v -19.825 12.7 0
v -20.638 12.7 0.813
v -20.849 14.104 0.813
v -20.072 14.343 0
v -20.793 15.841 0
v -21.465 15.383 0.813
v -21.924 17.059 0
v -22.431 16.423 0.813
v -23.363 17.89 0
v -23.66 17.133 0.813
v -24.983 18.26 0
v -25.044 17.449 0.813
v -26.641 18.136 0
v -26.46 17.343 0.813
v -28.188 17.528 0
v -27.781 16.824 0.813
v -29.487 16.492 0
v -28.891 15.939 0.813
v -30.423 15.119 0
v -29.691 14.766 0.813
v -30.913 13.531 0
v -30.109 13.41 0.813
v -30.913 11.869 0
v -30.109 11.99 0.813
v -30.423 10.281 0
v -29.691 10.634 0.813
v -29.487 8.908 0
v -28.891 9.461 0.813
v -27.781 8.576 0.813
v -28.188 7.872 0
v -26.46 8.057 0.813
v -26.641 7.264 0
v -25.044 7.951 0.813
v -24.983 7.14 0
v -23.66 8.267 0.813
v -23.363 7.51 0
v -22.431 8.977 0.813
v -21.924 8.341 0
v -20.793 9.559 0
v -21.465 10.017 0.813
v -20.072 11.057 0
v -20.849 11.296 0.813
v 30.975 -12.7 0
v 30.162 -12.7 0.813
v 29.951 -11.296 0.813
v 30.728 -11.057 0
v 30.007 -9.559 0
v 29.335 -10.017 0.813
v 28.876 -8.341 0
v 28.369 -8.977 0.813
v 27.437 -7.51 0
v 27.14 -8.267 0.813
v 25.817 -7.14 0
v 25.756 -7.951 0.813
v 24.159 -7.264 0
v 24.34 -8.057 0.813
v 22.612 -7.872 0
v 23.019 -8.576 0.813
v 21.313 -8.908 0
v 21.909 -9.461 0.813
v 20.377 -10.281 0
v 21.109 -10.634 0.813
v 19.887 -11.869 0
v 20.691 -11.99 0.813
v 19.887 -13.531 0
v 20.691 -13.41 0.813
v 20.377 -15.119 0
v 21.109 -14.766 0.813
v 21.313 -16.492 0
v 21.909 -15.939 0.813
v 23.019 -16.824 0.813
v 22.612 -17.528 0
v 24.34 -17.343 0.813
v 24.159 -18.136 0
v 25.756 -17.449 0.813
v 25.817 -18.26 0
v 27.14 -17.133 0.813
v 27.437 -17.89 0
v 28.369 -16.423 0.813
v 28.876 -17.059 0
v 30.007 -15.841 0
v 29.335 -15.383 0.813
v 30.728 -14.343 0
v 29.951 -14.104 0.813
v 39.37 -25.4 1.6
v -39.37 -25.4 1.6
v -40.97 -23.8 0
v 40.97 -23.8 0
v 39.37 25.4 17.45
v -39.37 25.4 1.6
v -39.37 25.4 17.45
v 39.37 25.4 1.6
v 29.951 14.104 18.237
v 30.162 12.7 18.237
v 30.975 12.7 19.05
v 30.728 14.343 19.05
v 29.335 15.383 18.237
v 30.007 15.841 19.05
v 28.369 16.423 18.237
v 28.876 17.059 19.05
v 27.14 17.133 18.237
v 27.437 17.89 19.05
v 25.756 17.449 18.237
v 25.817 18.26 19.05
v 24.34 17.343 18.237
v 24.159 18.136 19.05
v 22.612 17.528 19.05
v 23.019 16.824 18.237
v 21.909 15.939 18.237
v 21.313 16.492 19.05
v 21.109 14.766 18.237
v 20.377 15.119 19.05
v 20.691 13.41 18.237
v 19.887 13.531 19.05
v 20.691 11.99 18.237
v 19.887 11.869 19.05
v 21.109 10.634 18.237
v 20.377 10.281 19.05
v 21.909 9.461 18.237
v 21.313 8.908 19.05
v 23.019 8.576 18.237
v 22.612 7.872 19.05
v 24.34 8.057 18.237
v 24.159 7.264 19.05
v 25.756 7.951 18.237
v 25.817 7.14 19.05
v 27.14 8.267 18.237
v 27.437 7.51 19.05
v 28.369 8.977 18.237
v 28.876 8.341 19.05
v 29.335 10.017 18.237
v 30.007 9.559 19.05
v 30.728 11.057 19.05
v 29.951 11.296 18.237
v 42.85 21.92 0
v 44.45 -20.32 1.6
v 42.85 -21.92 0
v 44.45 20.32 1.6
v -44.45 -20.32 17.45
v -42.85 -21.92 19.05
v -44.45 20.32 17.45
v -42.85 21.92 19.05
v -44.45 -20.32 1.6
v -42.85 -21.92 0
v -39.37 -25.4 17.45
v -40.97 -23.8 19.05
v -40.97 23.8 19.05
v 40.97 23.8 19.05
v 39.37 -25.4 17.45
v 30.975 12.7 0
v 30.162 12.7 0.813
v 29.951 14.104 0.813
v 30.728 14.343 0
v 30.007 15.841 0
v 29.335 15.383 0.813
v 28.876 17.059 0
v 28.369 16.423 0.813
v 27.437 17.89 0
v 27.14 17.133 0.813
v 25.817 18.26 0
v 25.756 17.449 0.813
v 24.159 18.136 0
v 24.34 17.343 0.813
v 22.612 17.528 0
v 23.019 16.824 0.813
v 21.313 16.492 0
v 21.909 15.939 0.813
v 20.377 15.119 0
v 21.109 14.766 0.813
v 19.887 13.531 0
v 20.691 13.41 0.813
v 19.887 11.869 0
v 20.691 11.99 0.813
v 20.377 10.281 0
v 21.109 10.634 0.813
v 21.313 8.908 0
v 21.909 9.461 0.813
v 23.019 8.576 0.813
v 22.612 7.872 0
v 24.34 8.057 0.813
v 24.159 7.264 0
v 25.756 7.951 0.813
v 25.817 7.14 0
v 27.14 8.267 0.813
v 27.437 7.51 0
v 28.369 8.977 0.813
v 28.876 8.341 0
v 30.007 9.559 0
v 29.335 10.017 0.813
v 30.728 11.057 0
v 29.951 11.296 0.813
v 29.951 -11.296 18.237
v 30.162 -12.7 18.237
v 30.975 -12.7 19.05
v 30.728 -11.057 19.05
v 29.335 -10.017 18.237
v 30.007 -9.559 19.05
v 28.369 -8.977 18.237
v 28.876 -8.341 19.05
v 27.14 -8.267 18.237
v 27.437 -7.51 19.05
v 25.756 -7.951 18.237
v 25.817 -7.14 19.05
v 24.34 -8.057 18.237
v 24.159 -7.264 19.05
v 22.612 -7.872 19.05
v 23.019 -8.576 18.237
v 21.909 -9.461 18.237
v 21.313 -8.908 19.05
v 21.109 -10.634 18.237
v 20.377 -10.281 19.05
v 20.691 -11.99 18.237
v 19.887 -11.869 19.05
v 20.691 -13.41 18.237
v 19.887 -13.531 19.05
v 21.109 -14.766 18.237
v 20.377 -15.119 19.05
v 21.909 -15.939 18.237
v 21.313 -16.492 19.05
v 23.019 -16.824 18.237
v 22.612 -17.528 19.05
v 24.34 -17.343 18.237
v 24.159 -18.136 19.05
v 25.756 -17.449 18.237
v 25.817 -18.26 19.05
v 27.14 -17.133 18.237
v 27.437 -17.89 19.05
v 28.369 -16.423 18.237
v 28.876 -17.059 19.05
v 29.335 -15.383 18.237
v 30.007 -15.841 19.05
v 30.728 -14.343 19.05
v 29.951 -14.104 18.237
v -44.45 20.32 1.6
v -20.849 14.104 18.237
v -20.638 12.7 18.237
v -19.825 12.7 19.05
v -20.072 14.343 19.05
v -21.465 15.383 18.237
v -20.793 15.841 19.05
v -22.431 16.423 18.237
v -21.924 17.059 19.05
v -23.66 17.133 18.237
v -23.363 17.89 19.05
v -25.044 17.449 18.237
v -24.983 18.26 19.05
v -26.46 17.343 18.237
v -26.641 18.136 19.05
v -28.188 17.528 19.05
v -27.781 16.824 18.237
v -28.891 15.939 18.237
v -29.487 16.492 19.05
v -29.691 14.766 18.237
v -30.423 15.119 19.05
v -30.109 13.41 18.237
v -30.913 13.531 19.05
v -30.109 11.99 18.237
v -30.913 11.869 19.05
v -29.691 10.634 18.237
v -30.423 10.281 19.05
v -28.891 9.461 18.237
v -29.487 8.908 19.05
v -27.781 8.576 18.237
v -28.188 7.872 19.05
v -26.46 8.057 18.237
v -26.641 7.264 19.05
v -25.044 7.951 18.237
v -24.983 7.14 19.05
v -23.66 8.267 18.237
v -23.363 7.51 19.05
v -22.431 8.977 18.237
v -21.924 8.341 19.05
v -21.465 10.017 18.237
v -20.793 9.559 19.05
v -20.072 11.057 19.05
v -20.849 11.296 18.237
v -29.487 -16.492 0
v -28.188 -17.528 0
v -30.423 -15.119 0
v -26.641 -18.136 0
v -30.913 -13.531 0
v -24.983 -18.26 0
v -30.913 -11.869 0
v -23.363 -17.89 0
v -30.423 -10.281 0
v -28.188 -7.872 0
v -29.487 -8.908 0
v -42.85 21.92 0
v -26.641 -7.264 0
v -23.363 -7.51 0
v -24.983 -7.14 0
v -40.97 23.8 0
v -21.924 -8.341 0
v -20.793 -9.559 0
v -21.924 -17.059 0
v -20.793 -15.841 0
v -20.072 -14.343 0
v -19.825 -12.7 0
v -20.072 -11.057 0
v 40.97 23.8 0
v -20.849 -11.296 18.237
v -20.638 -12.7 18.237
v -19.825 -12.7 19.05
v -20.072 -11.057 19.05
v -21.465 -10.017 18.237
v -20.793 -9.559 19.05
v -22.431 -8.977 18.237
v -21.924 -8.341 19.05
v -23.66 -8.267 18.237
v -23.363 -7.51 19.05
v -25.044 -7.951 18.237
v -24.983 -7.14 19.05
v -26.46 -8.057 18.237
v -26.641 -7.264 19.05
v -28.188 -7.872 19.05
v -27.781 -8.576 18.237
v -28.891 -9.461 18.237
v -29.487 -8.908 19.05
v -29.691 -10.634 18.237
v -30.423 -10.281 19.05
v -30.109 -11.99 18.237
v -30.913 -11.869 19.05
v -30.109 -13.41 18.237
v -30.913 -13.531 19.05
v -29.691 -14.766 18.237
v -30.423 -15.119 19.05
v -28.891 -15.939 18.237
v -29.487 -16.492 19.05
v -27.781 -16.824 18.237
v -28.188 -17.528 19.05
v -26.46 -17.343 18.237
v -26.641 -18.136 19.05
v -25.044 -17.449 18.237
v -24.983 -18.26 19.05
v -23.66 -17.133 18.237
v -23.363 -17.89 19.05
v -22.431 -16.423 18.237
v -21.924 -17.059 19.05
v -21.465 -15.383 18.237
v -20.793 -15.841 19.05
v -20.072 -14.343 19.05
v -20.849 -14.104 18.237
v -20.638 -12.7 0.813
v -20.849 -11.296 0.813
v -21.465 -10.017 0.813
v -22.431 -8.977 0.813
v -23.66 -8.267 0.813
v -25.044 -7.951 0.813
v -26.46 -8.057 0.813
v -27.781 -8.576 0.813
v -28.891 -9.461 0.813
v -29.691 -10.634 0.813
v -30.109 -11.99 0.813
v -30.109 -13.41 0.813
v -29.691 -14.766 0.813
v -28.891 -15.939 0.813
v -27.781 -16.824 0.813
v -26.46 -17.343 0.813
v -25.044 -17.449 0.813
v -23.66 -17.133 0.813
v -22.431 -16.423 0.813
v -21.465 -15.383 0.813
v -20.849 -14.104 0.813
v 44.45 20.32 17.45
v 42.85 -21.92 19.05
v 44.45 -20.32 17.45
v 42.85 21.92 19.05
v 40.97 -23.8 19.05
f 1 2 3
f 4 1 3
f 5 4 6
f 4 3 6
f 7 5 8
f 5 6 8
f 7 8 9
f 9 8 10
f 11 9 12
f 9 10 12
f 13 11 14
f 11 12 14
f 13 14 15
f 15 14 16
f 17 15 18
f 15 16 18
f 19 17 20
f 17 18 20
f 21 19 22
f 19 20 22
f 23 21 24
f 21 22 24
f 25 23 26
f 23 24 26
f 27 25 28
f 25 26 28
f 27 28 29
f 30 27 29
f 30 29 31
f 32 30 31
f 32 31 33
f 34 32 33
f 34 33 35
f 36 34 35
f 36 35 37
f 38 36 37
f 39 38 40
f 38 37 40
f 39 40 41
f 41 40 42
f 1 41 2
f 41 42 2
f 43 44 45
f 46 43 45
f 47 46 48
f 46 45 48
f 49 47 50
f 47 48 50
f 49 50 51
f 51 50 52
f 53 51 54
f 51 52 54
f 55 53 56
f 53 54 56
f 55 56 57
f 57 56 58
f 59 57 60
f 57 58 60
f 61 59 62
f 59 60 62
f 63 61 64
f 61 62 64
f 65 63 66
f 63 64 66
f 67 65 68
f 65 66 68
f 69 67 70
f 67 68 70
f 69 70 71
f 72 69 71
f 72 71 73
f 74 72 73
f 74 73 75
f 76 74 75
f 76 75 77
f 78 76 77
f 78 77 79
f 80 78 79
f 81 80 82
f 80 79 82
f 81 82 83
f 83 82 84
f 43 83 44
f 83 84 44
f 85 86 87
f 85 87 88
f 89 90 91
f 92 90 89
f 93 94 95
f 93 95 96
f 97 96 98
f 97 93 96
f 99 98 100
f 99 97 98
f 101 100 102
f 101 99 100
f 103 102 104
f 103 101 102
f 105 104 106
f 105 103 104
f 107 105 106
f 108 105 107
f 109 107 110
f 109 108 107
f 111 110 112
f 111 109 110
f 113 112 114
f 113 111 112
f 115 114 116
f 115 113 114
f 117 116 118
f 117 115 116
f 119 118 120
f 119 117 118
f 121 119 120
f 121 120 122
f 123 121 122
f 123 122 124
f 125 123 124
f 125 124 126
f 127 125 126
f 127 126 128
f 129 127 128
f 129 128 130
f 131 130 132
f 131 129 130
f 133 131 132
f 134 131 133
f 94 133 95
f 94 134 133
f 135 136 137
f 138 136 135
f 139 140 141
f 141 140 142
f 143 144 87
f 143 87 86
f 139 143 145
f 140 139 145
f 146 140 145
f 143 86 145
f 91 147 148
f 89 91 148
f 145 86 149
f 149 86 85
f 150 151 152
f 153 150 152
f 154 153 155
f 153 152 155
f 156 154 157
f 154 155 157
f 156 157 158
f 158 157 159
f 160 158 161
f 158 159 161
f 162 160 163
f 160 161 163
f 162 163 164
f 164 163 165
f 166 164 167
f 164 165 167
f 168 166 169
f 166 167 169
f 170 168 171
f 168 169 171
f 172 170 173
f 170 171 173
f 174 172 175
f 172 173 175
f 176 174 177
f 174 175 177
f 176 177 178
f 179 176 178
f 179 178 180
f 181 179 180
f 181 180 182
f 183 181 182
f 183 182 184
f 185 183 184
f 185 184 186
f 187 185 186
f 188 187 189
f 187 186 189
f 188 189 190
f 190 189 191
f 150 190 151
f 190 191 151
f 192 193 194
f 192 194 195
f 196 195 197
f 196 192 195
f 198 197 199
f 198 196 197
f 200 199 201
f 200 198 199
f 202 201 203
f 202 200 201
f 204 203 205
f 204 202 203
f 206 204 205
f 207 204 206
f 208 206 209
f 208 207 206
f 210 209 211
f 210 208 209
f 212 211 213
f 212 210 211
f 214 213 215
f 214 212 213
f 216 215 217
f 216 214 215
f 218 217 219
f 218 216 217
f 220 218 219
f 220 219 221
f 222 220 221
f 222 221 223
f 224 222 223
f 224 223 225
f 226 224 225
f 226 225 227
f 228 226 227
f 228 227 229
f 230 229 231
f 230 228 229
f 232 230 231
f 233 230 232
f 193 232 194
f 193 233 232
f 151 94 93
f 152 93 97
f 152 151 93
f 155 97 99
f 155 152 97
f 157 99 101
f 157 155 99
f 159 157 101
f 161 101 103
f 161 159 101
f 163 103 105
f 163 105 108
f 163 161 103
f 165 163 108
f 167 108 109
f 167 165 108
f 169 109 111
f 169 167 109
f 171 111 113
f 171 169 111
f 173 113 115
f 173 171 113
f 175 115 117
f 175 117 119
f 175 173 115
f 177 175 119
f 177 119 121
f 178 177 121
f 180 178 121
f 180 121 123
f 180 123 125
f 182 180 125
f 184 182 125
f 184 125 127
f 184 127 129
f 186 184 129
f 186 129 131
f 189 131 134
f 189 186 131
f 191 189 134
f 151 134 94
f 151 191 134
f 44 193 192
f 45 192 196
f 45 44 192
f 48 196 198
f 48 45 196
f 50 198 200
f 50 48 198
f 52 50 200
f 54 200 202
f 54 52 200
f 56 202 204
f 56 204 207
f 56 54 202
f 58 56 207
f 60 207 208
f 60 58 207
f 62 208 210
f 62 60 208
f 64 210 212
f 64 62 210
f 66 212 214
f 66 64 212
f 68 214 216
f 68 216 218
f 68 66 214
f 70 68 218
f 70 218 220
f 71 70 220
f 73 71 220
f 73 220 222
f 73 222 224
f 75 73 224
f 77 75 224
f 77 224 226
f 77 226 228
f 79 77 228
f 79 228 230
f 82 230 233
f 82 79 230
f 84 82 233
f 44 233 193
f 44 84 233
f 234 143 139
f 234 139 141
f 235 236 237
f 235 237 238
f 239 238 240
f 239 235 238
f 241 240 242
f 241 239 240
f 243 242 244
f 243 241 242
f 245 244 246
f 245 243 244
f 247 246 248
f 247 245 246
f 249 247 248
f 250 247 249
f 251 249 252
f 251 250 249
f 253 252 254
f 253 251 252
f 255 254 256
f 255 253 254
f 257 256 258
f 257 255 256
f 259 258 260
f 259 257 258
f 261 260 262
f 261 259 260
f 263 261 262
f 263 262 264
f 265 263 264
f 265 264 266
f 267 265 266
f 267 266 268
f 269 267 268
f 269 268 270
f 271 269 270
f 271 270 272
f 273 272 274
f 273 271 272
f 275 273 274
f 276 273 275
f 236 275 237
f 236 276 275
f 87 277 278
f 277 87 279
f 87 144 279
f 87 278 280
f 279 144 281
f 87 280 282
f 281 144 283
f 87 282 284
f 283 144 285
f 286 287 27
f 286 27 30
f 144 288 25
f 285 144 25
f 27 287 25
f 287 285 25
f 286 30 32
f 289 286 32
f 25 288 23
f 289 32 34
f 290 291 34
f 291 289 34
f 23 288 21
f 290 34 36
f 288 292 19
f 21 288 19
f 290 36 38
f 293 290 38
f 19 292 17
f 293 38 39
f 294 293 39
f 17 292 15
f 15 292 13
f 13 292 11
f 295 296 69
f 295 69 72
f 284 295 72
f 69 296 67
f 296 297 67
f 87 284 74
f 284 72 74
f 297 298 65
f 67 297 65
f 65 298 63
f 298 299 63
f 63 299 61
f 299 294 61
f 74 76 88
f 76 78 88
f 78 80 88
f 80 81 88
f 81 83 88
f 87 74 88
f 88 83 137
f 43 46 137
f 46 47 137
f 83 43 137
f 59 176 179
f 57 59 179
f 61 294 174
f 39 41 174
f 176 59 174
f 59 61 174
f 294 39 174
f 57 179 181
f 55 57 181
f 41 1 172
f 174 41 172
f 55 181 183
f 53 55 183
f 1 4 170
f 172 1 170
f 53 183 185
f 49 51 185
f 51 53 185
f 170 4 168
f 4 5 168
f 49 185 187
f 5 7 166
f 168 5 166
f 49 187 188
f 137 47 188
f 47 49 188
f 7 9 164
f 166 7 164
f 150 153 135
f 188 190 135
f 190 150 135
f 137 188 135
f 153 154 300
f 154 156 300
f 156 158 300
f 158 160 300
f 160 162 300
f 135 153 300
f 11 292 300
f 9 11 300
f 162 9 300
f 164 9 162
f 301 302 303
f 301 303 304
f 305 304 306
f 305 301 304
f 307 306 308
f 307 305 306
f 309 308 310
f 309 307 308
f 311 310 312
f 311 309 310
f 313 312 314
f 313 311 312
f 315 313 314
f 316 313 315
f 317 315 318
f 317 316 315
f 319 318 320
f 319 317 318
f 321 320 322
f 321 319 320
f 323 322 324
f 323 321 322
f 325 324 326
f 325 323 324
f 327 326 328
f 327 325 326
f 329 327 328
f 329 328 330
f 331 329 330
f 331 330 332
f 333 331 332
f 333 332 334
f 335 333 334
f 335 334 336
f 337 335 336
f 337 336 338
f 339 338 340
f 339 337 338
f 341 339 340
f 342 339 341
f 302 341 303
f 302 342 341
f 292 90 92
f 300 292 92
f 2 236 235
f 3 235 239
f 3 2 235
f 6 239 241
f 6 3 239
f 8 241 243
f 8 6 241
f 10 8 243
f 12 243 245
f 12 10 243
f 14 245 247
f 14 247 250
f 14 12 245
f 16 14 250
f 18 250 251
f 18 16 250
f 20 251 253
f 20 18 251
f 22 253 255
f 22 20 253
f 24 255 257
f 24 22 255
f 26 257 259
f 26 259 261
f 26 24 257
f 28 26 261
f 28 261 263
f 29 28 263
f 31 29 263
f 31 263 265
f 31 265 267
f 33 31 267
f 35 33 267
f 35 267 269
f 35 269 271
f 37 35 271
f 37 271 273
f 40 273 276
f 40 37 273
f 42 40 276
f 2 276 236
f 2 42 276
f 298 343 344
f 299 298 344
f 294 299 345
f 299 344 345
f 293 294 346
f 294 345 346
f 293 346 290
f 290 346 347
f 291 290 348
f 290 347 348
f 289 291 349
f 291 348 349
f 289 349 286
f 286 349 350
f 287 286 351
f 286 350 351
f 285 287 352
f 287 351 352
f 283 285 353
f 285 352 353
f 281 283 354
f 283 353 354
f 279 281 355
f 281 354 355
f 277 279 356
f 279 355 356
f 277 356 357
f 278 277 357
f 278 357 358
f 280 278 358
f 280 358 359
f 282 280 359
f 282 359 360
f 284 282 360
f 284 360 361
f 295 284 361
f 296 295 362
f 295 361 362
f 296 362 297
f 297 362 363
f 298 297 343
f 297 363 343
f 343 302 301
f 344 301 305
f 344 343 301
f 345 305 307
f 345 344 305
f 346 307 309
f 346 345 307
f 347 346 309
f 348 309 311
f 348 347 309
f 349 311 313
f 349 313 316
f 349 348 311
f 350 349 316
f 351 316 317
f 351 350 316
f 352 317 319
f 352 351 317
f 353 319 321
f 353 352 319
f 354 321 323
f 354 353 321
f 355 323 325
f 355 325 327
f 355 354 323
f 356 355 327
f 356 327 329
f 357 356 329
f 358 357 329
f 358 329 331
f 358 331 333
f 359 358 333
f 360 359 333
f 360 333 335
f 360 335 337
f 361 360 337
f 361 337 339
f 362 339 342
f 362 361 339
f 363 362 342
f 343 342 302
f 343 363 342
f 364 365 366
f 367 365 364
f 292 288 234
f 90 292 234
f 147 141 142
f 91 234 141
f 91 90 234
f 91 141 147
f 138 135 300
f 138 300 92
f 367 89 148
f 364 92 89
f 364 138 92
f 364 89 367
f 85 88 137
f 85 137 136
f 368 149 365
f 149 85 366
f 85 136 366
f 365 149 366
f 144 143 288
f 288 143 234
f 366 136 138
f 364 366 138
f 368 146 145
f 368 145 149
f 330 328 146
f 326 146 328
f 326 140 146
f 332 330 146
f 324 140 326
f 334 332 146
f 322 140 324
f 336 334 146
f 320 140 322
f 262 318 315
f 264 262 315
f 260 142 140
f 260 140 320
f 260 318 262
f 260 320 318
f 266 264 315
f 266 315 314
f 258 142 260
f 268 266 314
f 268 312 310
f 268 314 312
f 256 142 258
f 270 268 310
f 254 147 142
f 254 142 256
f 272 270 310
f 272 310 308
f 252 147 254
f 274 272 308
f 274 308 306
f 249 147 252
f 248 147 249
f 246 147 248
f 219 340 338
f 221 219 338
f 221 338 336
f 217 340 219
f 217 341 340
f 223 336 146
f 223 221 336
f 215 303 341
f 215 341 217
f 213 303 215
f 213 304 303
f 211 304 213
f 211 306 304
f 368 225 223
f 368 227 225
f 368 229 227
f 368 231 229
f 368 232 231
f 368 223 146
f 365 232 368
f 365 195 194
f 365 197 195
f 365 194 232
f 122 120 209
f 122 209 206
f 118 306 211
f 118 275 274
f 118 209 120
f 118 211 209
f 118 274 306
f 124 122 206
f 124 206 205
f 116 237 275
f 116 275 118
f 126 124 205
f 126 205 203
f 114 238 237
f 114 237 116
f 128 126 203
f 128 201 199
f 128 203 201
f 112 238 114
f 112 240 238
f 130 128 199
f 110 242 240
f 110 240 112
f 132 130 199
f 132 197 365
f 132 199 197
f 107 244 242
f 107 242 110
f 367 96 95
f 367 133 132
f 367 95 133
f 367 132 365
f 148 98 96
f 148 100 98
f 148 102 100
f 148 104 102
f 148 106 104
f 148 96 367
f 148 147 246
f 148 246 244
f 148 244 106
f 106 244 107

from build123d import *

# Parameters (mm, degrees)
F0_W     = 88.9
F0_H     = 50.8
F0_R     = 4.7625
F1_DEPTH = 19.05
F2_SIZE  = 5.08
F3_SIZE  = 0.8128
F4_SIZE  = 1.6002


with BuildPart() as f1:
    # F0 (on Top) → F1 (new body)
    with BuildSketch(Plane.XY):
        Rectangle(F0_W, F0_H)
        with Locations((-25.4, -12.7)):
            Circle(F0_R, mode=Mode.SUBTRACT)
        with Locations((25.4, -12.7)):
            Circle(F0_R, mode=Mode.SUBTRACT)
        with Locations((-25.4, 12.7)):
            Circle(F0_R, mode=Mode.SUBTRACT)
        with Locations((25.4, 12.7)):
            Circle(F0_R, mode=Mode.SUBTRACT)
    extrude(amount=F1_DEPTH)

    # F2
    f2_edges = [f1.edges().sort_by_distance(p)[0] for p in [
        (44.45, -25.4, 9.525),
        (44.45, 25.4, 9.525),
        (-44.45, 25.4, 9.525),
        (-44.45, -25.4, 9.525),
    ]]
    chamfer(f2_edges, length=F2_SIZE)

    # F3
    f3_edges = [f1.edges().sort_by_distance(p)[0] for p in [
        (-30.1625, 12.7, 19.05),
        (-30.1625, 12.7, 0),
        (20.6375, 12.7, 19.05),
        (20.6375, 12.7, 0),
        (20.6375, -12.7, 19.05),
        (20.6375, -12.7, 0),
        (-30.1625, -12.7, 19.05),
        (-30.1625, -12.7, 0),
    ]]
    chamfer(f3_edges, length=F3_SIZE)

    # F4
    f4_edges = [f1.edges().sort_by_distance(p)[0] for p in [
        (0, -25.4, 19.05),
        (-44.45, 0, 19.05),
        (0, 25.4, 19.05),
        (-44.45, 0, 0),
        (0, -25.4, 0),
        (44.45, 0, 19.05),
        (44.45, 0, 0),
        (0, 25.4, 0),
    ]]
    chamfer(f4_edges, length=F4_SIZE)


solid = f1.part
